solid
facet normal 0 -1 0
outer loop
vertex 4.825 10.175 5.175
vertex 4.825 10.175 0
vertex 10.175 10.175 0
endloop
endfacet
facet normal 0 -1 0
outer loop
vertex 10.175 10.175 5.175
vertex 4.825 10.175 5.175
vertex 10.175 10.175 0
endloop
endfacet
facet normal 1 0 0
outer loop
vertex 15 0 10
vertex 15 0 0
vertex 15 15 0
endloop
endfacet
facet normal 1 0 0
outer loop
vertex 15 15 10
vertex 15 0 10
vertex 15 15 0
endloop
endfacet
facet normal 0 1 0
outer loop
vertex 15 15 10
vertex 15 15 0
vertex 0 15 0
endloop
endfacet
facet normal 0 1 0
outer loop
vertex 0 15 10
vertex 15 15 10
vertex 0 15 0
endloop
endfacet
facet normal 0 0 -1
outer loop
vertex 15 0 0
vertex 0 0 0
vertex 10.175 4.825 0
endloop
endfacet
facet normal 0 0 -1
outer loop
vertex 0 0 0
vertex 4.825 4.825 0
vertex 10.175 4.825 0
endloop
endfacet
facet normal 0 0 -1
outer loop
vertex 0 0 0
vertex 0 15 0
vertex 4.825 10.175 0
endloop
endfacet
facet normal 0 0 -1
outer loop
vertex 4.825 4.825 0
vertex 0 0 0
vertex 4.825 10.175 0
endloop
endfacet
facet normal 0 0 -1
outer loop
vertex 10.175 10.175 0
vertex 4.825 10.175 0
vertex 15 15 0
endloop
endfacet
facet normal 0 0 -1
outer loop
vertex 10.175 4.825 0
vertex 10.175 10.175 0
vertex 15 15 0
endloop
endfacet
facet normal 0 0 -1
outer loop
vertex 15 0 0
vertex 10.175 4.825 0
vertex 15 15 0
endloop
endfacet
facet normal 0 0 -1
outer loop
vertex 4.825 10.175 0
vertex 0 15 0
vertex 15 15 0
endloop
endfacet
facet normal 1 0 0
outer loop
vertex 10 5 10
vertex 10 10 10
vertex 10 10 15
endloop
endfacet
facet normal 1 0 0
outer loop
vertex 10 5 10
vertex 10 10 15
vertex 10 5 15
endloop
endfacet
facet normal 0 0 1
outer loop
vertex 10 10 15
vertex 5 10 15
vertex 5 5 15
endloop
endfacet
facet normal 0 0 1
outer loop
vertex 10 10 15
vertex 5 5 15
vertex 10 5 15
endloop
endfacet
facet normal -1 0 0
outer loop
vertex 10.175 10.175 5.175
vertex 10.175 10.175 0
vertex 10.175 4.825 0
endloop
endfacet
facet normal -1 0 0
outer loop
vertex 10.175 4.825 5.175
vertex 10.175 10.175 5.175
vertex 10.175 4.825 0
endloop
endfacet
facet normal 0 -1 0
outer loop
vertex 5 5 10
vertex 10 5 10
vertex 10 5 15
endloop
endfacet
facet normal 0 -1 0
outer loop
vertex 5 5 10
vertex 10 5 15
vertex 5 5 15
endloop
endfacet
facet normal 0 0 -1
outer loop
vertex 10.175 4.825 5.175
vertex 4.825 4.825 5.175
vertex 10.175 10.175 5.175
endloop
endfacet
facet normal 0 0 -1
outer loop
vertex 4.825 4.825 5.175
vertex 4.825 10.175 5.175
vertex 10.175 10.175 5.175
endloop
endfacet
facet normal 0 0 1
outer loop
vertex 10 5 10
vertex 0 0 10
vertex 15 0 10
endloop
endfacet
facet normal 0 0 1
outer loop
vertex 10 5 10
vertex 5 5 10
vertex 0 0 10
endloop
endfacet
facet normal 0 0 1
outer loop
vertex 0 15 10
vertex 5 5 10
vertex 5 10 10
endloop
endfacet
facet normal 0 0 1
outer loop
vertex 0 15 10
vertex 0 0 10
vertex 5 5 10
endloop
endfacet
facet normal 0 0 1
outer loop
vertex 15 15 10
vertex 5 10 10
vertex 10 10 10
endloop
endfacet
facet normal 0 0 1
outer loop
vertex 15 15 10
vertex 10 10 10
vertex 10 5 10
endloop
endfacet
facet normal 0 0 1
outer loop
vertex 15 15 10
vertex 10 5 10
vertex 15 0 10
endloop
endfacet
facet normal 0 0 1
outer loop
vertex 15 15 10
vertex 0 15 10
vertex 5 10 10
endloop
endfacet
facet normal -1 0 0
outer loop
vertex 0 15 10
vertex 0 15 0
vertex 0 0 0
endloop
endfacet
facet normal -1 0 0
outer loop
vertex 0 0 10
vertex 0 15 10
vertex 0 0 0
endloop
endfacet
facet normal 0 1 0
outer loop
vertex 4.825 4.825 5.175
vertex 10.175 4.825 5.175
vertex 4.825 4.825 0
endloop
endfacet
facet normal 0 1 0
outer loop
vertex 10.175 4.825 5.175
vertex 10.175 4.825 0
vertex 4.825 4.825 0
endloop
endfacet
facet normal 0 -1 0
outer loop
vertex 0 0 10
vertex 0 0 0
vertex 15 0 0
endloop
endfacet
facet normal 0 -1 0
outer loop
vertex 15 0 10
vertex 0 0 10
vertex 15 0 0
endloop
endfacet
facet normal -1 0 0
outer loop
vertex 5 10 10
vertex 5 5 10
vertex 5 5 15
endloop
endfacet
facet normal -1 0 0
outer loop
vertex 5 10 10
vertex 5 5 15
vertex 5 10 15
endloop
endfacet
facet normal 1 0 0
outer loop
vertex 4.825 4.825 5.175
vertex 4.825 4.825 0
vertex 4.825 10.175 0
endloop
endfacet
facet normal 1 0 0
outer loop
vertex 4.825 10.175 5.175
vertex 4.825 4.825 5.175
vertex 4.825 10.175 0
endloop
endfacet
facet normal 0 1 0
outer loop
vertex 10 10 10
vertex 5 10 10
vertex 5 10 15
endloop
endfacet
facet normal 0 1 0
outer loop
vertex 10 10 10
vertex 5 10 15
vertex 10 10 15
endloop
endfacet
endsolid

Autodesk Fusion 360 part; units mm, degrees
sketch "Sketch2" plane through (0, 0, 0) normal (0, 0, 1) x (1, 0, 0)
  line L0 (0, 0) -> (15, 0)
  line L1 (15, 0) -> (15, 15)
  line L2 (15, 15) -> (0, 15)
  line L3 (0, 15) -> (0, 0)
  line L4 (5, 10) -> (10, 10)
  line L5 (10, 10) -> (10, 5)
  line L6 (10, 5) -> (5, 5)
  line L7 (5, 5) -> (5, 10)
  line L8 (4.825, 10.175) -> (10.175, 10.175)
  line L9 (10.175, 10.175) -> (10.175, 4.825)
  line L10 (10.175, 4.825) -> (4.825, 4.825)
  line L11 (4.825, 4.825) -> (4.825, 10.175)
  dimension "d5" = -0.175
extrude "Extrude1" add sketch "Sketch2" along normal blind 10 contours L0 L1 L2 L3 | L8 L9 L10 L11
extrude "Extrude2" add sketch "Sketch2" along normal blind 15 contours L4 L5 L6 L7
extrude "Extrude3" cut sketch "Sketch2" along normal blind 6.175 contours L4 L5 L6 L7 | L8 L9 L10 L11
extrude "Extrude4" add 1 faces at (8.3917, 8.3917, 6.175) along direction (0, 0, -1) blind 1
